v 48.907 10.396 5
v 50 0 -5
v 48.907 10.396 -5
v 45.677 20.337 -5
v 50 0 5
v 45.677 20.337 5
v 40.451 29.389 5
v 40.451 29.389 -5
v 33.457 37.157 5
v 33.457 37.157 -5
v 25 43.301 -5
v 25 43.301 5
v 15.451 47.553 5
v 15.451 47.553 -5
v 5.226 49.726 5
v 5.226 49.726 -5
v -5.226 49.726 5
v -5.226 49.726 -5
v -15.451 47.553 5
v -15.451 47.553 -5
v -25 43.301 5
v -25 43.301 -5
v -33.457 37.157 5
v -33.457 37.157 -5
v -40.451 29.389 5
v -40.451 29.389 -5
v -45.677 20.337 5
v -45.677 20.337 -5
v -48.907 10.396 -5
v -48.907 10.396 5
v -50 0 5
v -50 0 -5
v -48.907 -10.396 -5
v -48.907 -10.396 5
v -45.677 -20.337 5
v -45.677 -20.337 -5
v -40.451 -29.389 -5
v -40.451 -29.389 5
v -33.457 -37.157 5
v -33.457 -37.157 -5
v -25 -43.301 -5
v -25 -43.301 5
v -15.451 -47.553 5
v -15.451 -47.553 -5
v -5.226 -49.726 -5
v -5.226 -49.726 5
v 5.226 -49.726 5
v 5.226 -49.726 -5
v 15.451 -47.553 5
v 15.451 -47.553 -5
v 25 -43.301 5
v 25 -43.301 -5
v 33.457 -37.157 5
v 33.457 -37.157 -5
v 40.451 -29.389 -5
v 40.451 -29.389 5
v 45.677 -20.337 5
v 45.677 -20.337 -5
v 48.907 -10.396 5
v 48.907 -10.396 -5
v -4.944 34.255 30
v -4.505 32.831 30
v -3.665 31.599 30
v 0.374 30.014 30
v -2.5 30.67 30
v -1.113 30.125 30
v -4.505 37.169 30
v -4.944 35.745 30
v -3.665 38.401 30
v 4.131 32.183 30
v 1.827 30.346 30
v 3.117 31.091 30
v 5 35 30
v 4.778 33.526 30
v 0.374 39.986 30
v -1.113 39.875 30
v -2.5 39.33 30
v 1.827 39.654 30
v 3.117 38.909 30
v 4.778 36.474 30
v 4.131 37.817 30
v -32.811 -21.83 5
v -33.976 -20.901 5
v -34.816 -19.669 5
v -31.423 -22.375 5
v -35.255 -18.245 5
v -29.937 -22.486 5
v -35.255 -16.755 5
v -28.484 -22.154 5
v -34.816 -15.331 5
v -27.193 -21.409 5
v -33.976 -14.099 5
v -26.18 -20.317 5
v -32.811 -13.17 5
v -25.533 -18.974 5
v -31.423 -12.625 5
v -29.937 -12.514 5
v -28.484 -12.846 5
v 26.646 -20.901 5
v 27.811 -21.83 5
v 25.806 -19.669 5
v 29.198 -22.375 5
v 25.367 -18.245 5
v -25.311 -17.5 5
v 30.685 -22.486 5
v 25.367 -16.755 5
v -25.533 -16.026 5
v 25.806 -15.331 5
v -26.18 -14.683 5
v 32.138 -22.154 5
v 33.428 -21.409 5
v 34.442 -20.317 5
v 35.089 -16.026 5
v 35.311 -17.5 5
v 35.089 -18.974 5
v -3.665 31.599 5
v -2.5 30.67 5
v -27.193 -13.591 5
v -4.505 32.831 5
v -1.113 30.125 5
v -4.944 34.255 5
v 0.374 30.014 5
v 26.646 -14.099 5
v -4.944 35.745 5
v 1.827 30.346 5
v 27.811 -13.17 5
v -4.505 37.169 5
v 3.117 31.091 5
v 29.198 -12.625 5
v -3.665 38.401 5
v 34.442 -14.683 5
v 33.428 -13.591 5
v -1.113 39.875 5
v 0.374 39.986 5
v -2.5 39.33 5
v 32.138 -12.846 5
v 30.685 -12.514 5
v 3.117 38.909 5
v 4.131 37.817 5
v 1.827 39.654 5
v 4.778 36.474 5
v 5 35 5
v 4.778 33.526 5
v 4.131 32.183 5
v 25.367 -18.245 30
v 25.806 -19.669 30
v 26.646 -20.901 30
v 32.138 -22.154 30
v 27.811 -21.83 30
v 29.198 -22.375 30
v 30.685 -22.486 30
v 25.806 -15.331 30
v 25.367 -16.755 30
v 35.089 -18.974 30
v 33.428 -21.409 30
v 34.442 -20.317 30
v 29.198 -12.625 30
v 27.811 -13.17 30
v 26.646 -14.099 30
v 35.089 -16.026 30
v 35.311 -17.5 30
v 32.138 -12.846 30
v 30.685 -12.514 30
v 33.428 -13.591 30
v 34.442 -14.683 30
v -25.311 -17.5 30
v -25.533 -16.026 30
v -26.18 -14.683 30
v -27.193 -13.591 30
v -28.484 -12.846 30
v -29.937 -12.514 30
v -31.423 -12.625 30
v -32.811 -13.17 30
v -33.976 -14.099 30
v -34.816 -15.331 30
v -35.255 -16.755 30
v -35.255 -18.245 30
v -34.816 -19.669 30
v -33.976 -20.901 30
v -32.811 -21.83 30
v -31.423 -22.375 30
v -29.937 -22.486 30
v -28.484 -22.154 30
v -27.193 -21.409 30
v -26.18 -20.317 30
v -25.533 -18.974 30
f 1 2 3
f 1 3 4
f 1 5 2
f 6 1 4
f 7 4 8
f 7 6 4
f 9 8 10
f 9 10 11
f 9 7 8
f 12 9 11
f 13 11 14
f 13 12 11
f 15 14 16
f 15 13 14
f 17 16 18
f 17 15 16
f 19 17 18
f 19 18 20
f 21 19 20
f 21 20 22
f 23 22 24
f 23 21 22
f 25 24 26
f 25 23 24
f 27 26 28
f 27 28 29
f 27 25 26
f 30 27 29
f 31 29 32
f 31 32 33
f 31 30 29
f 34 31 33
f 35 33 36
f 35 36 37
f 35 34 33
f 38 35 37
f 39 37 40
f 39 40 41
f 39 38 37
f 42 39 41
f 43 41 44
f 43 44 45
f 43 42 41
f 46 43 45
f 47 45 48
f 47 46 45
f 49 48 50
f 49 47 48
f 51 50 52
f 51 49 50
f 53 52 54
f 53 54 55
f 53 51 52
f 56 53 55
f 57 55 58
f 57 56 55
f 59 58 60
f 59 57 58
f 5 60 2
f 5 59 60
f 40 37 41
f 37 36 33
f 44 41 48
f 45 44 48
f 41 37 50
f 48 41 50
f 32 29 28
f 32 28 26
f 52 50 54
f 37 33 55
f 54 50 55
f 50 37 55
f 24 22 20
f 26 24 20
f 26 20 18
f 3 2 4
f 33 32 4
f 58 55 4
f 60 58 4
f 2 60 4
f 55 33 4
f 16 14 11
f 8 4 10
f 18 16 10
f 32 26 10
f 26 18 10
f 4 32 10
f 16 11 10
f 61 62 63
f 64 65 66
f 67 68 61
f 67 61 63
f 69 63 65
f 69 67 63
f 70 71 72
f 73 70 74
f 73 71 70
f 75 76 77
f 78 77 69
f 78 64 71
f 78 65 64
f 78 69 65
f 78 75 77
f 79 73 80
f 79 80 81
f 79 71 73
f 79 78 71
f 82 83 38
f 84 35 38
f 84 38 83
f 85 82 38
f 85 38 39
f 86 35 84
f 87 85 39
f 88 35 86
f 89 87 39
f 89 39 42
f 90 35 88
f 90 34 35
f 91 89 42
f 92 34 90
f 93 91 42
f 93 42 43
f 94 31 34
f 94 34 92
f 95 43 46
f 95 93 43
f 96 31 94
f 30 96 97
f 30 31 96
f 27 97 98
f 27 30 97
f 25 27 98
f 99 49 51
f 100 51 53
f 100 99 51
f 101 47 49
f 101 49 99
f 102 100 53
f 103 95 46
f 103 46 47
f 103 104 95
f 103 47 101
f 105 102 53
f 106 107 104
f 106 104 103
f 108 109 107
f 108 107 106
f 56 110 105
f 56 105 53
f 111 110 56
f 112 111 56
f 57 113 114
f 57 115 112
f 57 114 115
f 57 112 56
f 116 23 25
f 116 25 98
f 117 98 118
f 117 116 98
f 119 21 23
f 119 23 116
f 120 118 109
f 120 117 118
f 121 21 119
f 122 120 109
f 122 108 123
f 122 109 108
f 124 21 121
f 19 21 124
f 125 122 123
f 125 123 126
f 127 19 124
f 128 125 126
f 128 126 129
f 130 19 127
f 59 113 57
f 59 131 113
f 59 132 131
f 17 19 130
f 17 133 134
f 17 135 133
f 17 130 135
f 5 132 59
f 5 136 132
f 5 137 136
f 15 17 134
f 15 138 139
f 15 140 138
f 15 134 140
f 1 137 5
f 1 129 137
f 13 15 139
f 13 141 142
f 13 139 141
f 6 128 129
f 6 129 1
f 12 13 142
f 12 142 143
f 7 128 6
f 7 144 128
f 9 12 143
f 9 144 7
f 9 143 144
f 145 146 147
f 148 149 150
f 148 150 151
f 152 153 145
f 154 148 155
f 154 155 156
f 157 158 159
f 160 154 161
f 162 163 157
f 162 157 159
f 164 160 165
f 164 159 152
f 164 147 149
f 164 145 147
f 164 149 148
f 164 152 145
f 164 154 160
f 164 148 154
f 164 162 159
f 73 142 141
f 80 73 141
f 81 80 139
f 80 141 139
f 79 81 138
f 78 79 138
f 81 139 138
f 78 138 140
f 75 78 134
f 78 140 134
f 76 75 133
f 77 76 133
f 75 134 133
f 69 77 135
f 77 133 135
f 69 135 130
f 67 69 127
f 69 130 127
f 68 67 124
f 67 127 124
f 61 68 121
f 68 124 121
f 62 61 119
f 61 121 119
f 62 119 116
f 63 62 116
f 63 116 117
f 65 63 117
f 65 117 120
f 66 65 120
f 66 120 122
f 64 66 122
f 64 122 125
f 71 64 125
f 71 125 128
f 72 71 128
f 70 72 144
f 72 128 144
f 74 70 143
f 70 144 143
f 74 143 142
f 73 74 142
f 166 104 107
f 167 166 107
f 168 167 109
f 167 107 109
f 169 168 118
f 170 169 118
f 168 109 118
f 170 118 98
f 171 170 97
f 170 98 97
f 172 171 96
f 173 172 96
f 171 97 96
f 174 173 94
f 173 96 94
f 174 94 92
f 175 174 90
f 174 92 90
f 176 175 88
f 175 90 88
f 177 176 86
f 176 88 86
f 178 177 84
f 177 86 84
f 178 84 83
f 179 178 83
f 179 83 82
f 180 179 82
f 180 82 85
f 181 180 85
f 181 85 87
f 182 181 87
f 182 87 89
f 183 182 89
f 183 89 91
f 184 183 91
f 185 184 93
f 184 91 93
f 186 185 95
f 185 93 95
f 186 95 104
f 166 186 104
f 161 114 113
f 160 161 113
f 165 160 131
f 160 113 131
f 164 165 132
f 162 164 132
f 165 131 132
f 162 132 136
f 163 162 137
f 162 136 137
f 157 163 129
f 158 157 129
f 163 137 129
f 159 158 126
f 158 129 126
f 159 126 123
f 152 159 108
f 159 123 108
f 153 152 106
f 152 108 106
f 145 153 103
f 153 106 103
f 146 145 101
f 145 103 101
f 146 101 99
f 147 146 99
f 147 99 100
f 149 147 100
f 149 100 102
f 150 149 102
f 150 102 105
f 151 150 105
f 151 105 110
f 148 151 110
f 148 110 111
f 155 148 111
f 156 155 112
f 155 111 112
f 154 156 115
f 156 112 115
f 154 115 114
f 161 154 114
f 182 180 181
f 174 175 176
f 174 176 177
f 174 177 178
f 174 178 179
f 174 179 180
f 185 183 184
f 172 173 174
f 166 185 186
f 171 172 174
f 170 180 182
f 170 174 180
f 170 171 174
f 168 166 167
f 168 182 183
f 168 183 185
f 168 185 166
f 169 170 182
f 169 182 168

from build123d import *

# Parameters (mm, degrees)
F0_R     = 50
F1_DEPTH = 5
F2_R     = 5
F3_DEPTH = 25


with BuildPart() as f1:
    # F0 (on Top) → F1 (new body, symmetric)
    with BuildSketch(Plane.XY):
        Circle(F0_R)
    extrude(amount=F1_DEPTH, both=True)

    # F2 (on face) → F3 (join)
    with BuildSketch(Plane.XY.offset(5)):
        with Locations((0, 35)):
            Circle(F2_R)
        with Locations((30.310889, -17.5)):
            Circle(F2_R)
        with Locations((-30.310889, -17.5)):
            Circle(F2_R)
    extrude(amount=F3_DEPTH)


solid = f1.part
